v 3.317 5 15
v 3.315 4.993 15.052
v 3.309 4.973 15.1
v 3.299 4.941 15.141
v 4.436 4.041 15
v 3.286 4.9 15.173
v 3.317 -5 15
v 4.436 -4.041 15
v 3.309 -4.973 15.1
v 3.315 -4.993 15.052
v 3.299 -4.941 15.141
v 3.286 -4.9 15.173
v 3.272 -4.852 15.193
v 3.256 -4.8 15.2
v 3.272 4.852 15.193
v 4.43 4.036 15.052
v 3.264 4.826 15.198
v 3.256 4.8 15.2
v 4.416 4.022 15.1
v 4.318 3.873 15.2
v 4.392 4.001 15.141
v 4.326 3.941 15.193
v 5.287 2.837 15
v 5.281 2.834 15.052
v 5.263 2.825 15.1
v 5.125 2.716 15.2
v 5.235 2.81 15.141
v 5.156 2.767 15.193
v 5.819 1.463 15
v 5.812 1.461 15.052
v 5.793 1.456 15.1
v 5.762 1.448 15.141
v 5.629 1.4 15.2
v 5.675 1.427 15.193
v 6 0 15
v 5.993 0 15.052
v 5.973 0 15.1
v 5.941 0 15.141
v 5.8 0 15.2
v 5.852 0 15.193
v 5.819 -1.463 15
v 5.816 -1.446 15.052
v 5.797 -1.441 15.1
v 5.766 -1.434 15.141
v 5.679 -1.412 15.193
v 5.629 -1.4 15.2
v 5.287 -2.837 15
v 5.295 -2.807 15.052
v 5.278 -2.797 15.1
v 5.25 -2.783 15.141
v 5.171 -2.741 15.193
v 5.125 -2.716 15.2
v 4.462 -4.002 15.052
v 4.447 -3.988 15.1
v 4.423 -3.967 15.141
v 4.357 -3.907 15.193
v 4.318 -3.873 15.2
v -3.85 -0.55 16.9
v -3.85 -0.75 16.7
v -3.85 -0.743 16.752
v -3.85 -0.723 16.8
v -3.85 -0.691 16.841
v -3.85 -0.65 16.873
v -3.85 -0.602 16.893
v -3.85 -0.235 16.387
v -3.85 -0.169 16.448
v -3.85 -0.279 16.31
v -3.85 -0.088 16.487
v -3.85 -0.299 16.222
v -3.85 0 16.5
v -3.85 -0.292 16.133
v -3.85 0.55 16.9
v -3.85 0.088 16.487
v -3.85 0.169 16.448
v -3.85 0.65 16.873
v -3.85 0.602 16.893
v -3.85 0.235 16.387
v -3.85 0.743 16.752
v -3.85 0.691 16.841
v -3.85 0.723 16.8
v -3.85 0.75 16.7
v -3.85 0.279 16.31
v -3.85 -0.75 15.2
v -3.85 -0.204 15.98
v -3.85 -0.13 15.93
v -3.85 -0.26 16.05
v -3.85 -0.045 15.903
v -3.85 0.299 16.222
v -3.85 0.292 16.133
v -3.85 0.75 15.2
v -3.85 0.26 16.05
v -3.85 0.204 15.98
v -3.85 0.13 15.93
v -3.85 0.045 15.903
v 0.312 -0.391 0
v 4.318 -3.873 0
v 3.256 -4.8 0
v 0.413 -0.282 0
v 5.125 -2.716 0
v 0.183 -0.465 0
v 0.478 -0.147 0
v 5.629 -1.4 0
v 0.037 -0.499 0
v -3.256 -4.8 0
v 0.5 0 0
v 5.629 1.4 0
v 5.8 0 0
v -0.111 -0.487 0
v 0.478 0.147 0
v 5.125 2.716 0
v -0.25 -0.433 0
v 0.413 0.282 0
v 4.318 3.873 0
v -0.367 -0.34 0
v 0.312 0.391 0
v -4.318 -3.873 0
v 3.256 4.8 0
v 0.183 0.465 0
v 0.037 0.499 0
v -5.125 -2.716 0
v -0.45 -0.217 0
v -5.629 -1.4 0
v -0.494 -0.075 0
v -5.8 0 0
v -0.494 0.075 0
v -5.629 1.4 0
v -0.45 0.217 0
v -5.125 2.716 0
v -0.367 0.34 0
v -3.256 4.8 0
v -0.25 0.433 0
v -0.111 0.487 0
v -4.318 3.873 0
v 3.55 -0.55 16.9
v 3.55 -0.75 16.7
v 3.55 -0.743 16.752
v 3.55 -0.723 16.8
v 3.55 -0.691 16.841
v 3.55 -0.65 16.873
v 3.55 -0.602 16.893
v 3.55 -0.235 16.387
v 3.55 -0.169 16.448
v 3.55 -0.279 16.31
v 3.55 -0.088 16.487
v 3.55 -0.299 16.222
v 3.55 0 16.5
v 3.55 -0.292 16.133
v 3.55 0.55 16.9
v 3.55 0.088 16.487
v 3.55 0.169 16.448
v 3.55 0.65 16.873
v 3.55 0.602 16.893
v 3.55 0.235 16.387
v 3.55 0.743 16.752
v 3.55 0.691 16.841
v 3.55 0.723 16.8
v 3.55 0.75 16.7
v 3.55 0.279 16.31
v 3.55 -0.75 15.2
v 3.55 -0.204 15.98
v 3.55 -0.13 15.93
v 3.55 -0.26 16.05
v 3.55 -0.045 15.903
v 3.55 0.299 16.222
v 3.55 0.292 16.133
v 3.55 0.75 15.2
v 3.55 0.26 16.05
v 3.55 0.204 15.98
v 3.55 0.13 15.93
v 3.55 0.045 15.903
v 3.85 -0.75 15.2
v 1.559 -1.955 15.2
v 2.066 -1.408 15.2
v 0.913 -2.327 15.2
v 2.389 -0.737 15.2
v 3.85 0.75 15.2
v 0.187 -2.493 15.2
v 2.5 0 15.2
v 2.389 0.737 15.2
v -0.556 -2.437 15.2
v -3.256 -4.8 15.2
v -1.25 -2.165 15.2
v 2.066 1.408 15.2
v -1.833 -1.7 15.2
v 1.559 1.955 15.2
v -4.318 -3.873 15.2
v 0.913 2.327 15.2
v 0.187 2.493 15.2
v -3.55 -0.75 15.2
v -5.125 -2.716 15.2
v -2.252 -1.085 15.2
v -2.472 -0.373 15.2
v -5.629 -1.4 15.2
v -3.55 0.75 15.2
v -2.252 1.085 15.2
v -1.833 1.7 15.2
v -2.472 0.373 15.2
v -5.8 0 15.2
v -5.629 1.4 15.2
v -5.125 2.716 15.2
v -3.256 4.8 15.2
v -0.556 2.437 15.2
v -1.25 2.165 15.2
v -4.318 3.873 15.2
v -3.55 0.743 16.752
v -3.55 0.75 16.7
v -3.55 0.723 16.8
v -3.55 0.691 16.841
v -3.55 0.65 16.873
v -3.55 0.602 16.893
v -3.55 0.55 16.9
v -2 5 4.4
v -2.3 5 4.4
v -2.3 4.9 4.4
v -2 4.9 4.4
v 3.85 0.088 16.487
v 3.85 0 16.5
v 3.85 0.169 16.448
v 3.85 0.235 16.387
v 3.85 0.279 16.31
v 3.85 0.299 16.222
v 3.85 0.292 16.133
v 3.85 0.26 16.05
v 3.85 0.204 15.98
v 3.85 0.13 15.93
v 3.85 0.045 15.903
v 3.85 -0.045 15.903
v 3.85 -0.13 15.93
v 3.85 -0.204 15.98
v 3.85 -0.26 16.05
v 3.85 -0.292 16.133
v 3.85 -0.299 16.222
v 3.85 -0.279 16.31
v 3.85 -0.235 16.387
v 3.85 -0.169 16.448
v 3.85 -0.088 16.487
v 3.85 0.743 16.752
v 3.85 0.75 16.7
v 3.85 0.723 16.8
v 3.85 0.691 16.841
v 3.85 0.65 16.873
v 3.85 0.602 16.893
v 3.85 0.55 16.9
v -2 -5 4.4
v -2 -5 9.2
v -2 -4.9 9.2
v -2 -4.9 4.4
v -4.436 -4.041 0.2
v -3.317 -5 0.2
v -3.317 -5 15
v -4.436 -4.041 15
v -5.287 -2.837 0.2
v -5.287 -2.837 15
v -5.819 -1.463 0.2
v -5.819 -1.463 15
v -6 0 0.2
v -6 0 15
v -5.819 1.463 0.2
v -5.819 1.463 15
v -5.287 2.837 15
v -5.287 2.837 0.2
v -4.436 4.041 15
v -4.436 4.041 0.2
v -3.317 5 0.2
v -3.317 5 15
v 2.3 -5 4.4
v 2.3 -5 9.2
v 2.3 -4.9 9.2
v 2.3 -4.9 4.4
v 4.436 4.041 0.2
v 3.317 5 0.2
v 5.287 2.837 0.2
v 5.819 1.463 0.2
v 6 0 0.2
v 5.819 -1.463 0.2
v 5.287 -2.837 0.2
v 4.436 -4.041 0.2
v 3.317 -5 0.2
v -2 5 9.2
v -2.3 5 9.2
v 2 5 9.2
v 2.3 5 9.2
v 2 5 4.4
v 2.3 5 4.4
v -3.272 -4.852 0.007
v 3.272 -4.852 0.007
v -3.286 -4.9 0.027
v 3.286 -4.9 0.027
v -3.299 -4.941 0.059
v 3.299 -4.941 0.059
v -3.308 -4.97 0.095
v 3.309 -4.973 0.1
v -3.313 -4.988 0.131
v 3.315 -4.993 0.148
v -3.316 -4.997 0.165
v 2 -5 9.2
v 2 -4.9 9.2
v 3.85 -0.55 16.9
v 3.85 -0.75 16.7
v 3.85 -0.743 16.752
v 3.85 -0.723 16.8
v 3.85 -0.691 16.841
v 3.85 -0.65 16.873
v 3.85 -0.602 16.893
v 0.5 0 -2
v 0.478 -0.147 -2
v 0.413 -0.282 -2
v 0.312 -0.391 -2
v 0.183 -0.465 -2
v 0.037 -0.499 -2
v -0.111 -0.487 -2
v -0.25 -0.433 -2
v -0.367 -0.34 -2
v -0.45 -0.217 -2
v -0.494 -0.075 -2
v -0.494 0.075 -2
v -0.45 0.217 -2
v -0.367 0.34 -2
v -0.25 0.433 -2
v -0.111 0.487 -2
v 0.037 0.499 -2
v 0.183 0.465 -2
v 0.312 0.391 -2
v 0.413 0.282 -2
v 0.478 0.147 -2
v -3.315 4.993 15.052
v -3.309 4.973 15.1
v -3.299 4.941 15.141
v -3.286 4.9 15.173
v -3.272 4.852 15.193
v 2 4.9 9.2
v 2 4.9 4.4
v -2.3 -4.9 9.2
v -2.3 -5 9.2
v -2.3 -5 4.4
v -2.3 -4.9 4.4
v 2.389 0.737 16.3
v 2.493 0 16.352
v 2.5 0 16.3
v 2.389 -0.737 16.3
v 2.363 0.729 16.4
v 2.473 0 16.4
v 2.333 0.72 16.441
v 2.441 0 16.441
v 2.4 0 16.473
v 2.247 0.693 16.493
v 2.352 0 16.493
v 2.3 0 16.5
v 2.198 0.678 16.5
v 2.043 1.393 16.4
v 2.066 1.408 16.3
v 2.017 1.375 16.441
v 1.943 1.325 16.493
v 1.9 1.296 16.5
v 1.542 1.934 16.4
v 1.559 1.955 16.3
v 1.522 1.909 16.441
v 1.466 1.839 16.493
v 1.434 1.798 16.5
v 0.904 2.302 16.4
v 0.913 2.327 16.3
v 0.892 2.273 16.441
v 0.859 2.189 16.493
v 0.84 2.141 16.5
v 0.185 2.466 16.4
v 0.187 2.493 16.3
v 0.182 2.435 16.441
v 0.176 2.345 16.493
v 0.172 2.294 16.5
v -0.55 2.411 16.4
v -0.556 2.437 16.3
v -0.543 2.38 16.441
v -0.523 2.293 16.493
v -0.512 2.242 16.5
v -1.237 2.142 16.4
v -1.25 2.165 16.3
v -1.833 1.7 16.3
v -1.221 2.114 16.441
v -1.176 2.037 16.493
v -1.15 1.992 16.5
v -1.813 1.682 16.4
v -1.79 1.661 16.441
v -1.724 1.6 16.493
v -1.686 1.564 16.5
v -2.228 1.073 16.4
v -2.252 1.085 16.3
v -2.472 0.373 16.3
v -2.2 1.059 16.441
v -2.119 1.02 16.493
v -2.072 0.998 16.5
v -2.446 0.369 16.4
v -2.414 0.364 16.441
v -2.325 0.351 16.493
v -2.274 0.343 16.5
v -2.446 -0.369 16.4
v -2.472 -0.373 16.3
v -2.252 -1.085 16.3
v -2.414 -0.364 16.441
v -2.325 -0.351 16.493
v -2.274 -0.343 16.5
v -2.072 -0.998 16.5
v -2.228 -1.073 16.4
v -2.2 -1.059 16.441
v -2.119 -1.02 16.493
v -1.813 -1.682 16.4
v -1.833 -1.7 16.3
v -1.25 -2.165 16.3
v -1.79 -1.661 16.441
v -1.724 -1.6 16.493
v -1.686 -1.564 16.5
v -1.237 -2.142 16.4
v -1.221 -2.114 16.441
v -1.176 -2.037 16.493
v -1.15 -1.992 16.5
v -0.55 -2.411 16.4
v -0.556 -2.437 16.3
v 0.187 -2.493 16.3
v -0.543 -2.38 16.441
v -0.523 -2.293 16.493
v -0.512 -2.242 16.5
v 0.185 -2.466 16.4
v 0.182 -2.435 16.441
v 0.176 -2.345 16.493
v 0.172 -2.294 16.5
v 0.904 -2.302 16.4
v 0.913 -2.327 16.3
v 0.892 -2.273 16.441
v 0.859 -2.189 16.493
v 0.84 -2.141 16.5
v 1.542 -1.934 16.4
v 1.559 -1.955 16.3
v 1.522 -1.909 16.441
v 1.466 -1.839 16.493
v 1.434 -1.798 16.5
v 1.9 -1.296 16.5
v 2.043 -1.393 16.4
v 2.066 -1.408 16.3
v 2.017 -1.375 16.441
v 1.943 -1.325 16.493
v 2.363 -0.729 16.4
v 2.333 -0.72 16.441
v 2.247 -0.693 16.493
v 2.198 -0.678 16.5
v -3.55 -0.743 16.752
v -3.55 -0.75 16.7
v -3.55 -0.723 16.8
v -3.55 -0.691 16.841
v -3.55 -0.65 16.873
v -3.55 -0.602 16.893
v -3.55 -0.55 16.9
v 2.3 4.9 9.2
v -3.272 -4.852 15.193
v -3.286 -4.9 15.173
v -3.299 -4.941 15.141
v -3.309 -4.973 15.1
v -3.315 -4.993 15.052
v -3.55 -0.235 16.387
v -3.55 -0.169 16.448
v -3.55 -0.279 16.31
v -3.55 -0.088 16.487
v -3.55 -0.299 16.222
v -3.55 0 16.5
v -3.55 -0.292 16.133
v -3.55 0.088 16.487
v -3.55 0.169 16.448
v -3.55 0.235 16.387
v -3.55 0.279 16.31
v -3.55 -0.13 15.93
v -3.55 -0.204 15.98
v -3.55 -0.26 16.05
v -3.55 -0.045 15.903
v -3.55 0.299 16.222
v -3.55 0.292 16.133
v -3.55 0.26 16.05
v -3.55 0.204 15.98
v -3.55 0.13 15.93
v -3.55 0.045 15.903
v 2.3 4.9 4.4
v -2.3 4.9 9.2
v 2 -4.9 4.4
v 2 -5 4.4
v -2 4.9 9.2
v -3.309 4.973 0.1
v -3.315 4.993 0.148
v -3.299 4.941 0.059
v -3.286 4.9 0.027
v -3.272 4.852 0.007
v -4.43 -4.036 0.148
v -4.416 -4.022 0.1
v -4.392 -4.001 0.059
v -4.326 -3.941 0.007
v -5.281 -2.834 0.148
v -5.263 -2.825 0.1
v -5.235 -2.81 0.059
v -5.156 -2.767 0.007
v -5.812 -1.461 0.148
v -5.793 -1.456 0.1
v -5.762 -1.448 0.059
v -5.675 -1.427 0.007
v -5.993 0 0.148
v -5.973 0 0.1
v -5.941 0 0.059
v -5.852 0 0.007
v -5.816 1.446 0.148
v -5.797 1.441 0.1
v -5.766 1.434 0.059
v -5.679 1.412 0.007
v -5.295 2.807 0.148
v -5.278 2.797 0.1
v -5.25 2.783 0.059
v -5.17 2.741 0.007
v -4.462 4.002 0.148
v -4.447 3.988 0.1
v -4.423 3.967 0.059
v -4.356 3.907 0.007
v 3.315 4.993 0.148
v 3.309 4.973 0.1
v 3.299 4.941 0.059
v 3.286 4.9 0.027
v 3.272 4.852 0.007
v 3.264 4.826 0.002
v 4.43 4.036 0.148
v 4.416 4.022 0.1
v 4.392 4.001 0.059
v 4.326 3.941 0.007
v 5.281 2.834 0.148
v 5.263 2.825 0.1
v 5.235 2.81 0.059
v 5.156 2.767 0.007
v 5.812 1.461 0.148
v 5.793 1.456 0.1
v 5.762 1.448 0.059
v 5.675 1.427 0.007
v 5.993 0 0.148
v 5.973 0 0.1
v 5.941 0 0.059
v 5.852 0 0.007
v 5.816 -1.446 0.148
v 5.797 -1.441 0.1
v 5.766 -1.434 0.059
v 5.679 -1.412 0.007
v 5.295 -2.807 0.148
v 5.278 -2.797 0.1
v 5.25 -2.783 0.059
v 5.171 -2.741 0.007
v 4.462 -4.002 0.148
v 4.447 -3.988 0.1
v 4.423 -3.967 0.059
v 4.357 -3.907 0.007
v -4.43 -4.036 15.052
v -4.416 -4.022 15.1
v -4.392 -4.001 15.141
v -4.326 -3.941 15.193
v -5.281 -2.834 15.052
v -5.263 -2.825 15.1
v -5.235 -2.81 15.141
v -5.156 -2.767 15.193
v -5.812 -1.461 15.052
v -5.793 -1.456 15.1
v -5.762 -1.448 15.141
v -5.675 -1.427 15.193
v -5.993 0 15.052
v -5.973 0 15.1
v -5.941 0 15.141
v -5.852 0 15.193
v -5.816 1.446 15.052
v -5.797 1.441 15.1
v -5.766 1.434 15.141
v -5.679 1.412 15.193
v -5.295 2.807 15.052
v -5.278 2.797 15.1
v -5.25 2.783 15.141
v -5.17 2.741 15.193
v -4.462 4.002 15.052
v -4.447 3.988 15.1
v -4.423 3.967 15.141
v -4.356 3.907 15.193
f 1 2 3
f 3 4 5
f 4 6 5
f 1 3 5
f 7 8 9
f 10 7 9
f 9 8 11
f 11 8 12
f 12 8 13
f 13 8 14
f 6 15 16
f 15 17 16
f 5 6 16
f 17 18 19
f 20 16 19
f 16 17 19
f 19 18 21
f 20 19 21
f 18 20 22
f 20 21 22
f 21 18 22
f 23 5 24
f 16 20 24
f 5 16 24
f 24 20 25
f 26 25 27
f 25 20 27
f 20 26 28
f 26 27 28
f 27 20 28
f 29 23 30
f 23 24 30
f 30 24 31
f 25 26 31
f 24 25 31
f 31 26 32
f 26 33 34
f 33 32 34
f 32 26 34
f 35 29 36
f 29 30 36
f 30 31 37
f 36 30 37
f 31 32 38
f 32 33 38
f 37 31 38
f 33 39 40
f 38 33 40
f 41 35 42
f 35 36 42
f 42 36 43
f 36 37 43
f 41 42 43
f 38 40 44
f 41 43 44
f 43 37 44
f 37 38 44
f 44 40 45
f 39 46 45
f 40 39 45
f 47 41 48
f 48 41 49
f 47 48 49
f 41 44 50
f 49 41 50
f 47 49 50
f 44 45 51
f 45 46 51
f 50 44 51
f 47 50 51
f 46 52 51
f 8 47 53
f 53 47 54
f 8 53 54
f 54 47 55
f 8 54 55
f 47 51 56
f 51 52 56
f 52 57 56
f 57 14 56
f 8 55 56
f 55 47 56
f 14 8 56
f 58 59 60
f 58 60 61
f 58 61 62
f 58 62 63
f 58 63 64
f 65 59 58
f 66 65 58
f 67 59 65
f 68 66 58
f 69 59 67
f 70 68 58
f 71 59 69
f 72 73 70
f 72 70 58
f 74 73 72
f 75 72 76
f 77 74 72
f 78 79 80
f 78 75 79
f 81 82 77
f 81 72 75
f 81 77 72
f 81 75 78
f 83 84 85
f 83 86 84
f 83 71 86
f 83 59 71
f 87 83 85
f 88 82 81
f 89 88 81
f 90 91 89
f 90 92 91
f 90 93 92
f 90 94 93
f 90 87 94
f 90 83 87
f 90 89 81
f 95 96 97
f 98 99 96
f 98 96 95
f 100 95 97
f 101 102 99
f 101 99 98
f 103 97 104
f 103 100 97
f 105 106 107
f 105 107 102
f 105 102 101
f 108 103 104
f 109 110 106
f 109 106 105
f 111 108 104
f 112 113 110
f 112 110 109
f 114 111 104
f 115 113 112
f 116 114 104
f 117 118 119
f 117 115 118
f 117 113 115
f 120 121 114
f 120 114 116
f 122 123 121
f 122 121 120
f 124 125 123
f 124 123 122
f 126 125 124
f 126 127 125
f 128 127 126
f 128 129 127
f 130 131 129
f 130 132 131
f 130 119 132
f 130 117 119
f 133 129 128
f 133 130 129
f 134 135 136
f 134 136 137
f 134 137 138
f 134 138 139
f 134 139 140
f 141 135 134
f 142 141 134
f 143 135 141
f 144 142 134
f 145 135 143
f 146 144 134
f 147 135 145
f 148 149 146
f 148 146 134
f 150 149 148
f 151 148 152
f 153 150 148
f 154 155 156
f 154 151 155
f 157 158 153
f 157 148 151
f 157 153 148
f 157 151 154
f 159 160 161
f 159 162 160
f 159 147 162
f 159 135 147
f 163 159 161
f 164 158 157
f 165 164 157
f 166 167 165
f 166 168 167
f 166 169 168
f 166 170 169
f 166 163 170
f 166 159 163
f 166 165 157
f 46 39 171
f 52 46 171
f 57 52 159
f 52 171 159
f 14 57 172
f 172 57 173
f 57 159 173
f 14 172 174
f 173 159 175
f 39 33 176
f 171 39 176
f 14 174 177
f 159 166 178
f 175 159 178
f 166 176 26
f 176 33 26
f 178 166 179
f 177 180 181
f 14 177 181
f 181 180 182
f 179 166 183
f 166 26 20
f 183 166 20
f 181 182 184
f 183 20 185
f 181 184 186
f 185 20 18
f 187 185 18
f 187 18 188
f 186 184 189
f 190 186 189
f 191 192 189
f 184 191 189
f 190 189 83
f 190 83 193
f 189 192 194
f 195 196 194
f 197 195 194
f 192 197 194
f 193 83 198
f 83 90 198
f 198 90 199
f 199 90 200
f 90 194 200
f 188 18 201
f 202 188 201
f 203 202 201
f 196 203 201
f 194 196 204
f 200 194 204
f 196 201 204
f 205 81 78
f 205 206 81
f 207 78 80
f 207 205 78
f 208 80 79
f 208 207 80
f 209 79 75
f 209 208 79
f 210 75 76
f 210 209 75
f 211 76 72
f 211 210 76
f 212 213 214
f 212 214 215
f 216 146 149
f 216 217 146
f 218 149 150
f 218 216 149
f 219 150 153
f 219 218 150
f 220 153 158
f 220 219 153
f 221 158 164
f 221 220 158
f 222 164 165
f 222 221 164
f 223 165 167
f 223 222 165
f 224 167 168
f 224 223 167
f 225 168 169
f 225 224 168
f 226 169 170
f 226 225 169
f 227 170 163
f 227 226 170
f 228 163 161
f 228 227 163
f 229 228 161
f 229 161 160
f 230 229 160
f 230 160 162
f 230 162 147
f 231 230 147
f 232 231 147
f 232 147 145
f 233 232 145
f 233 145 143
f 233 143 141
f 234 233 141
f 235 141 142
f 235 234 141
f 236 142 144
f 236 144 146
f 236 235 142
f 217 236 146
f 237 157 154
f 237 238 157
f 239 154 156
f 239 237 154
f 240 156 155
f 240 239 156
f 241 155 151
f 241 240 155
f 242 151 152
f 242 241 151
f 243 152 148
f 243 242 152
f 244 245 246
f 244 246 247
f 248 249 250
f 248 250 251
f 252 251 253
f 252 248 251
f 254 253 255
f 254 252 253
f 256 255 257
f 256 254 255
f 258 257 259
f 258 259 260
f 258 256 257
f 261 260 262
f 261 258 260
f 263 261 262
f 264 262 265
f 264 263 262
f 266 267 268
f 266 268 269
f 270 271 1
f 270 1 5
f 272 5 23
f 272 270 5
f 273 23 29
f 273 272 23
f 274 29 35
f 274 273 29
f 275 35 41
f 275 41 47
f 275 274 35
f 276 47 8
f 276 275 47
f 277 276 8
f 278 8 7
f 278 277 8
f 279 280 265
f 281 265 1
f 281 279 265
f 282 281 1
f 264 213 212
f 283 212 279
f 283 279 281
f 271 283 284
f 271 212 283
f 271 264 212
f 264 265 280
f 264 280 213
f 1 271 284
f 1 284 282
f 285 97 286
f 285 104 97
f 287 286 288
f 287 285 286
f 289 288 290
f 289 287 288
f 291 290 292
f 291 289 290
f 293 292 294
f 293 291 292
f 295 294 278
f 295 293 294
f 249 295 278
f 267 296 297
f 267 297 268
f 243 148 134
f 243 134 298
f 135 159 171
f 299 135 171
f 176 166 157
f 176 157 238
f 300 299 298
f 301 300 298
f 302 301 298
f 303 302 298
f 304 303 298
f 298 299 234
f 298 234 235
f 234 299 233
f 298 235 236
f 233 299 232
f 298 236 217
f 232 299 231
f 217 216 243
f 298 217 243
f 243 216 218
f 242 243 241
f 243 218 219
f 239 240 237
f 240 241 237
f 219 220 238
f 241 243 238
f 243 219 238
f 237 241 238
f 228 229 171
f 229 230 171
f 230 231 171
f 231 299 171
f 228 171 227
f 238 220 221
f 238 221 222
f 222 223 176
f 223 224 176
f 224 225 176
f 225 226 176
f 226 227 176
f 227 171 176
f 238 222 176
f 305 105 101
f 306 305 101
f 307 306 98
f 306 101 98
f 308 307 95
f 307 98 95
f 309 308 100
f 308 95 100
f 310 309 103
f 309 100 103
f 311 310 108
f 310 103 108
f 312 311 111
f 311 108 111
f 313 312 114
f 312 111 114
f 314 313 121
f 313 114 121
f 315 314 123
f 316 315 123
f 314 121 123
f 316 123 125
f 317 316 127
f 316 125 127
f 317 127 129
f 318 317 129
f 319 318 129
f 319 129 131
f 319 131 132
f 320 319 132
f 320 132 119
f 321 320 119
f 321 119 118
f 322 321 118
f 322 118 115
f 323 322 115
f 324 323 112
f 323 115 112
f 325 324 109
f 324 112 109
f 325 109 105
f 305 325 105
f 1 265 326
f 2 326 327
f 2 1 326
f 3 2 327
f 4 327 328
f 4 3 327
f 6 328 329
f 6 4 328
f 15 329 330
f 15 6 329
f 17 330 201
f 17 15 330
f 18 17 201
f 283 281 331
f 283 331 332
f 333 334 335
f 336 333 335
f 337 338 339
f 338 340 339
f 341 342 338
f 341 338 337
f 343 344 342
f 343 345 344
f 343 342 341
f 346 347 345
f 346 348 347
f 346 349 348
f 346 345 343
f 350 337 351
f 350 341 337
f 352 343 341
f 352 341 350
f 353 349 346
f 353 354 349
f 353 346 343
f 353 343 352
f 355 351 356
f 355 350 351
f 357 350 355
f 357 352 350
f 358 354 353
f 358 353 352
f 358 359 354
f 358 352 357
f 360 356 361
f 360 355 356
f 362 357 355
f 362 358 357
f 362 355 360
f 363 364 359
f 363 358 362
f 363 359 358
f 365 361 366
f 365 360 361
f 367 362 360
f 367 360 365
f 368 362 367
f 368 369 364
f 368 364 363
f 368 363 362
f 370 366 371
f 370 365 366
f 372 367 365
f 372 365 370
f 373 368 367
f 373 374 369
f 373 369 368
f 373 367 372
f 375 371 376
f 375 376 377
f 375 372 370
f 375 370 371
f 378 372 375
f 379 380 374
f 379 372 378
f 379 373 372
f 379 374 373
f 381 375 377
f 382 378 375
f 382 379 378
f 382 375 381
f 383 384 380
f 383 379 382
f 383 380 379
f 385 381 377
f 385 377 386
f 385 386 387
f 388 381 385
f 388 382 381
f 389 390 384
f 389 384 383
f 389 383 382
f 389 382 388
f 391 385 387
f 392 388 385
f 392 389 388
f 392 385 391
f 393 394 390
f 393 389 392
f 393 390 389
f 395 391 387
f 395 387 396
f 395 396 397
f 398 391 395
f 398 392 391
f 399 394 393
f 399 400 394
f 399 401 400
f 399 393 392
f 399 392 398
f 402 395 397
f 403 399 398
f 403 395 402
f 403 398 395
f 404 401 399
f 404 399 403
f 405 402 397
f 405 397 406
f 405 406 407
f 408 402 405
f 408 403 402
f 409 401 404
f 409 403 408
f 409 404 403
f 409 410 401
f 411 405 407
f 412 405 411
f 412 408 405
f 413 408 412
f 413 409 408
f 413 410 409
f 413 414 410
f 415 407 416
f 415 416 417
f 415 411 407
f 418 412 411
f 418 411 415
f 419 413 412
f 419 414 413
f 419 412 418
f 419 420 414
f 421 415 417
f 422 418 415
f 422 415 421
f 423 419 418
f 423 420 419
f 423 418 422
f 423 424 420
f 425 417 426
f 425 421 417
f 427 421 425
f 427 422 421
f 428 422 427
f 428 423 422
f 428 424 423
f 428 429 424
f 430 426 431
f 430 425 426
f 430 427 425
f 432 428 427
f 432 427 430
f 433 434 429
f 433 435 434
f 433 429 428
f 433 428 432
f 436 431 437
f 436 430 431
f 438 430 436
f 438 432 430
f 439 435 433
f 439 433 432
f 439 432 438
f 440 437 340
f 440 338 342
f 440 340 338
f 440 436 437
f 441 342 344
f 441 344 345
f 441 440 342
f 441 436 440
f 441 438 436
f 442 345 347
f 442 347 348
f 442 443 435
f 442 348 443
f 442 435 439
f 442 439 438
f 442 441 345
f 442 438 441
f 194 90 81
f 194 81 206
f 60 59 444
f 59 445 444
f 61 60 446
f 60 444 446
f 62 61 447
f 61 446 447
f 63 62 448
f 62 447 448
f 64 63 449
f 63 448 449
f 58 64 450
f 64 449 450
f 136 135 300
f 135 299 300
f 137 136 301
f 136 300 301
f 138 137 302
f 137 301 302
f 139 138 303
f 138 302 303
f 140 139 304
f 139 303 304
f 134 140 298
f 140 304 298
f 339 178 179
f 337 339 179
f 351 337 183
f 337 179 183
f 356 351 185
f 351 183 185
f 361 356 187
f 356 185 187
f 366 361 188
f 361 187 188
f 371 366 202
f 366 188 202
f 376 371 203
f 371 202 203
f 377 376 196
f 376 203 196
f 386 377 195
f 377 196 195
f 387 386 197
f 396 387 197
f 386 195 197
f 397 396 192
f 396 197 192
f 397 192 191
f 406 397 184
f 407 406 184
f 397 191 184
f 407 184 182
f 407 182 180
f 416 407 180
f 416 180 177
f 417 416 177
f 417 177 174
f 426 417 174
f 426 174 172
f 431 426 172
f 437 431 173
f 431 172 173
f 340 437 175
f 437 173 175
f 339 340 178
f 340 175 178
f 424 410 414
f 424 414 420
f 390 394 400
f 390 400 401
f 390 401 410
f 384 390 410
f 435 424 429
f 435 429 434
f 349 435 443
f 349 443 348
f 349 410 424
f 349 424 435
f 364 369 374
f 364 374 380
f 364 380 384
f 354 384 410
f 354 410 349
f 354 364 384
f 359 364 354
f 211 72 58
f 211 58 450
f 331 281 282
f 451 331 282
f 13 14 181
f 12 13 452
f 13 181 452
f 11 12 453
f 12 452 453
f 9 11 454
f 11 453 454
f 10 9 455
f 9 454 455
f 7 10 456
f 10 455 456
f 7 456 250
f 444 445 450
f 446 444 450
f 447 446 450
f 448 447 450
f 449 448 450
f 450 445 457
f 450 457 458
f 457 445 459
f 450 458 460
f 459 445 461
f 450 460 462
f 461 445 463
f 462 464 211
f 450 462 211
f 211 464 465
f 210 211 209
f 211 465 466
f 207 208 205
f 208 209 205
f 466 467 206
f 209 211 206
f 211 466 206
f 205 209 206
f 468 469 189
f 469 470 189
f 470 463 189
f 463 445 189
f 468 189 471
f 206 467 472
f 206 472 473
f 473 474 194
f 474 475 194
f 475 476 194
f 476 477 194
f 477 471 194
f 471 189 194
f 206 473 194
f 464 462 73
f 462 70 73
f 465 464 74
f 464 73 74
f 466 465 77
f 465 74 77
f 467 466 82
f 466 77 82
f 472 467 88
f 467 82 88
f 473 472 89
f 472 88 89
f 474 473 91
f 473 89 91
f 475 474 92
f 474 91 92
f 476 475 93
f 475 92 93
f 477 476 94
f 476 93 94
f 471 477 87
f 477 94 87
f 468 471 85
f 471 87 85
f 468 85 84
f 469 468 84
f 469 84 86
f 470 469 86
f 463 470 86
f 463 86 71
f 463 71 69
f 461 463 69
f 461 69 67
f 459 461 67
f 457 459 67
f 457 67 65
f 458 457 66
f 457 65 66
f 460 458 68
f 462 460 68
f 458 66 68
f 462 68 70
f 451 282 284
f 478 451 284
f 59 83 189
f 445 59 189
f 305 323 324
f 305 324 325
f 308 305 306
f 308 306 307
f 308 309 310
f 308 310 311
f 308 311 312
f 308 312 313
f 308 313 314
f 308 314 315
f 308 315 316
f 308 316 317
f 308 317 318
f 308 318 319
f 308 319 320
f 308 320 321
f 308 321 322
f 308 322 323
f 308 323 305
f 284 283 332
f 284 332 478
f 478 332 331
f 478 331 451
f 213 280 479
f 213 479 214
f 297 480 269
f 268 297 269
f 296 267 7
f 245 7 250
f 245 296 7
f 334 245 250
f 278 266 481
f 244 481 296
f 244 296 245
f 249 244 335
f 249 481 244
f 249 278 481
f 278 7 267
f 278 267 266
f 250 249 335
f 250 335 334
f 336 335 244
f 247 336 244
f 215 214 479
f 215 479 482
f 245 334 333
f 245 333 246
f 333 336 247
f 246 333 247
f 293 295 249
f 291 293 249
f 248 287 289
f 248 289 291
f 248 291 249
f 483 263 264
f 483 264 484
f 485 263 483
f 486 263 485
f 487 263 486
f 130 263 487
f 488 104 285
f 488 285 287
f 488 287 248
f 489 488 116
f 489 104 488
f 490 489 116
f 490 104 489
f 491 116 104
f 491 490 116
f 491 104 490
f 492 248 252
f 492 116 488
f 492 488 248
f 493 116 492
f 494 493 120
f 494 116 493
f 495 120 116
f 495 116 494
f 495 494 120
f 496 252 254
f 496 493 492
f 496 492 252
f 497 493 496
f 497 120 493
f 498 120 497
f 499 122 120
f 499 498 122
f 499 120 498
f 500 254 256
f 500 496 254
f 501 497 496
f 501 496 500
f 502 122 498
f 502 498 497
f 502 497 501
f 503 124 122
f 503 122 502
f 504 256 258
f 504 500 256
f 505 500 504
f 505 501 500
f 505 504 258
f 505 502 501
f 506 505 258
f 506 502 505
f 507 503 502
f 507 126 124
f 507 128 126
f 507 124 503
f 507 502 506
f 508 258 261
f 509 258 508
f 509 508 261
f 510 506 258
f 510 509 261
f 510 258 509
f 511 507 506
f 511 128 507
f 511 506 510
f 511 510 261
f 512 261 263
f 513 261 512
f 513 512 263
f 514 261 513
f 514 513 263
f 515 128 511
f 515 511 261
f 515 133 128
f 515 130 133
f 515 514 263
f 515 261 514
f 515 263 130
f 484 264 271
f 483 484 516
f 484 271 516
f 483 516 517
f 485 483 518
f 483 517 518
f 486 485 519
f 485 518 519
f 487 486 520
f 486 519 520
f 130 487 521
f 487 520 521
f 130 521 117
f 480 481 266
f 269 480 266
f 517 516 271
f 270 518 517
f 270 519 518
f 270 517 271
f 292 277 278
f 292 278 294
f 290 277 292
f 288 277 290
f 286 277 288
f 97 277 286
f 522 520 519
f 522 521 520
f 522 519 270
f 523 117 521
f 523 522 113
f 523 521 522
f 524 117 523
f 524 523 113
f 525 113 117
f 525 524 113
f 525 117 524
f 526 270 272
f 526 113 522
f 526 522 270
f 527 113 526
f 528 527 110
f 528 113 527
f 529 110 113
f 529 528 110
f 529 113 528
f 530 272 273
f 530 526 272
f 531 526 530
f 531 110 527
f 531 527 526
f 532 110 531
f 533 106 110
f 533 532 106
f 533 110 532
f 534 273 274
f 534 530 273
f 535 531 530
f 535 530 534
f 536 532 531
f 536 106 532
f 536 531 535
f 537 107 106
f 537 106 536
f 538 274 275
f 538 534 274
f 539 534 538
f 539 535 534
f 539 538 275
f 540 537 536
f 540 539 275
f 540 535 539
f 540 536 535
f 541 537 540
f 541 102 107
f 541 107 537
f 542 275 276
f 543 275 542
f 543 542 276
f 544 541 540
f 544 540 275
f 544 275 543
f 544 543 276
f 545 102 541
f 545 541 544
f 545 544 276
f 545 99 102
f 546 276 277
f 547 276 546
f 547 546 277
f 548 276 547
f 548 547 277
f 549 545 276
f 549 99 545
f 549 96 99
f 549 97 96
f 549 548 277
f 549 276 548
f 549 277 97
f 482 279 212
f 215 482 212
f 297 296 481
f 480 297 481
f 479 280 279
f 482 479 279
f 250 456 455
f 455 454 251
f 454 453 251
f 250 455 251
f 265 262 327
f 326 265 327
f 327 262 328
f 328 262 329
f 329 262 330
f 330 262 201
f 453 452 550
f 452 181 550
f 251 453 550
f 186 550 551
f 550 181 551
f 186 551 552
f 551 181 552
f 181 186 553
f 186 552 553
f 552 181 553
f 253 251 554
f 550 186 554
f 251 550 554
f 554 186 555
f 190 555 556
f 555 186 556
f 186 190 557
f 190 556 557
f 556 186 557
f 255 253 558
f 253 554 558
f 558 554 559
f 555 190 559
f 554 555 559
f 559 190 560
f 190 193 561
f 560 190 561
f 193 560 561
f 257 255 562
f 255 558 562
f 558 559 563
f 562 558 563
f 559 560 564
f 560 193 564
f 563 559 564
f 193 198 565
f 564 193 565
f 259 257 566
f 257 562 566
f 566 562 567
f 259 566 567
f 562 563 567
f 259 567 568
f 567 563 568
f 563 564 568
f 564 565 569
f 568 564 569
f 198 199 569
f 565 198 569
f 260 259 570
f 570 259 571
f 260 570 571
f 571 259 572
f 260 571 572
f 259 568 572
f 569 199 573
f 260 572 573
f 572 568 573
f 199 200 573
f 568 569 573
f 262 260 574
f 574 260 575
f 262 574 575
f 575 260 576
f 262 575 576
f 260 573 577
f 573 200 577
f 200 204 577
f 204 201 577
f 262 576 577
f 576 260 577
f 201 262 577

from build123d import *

# Parameters (mm, degrees)
AUFSATZ_LINEAR_AUSTRAGEN1_DEPTH = 15.2
SKIZZE2_R                       = 2.5
AUFSATZ_LINEAR_AUSTRAGEN2_DEPTH = 1.3
SKIZZE3_R                       = 0.5
AUFSATZ_LINEAR_AUSTRAGEN3_DEPTH = 2
VERRUNDUNG1_R                   = 0.2
SKIZZE4_W                       = 0.3
SKIZZE4_H                       = 4.8
SCHNITT_LINEAR_AUSTRAGEN1_DEPTH = 0.1
SKIZZE5_W                       = 0.3
SKIZZE5_H                       = 1.5
AUFSATZ_LINEAR_AUSTRAGEN4_DEPTH = 1.7
SCHNITT_LINEAR_AUSTRAGEN2_REACH = 22.19
SKIZZE6_R                       = 0.3
VERRUNDUNG2_R                   = 0.2


with BuildPart() as part:
    # Skizze1 → Aufsatz-Linear austragen1 (new body)
    with BuildSketch(Plane.XY):
        with BuildLine():
            Line((-3.31662479, 5), (3.31662479, 5))
            ThreePointArc((3.31662479, 5), (6, 0), (3.31662479, -5))
            Line((3.31662479, -5), (-3.31662479, -5))
            ThreePointArc((-3.31662479, -5), (-6, 0), (-3.31662479, 5))
        make_face()
    extrude(amount=AUFSATZ_LINEAR_AUSTRAGEN1_DEPTH)

    # Skizze2 → Aufsatz-Linear austragen2 (add)
    with BuildSketch(Plane.XY.offset(15.2)):
        Circle(SKIZZE2_R)
    extrude(amount=AUFSATZ_LINEAR_AUSTRAGEN2_DEPTH)

    # Skizze3 → Aufsatz-Linear austragen3 (add)
    with BuildSketch(Plane(origin=(0, 0, 0), x_dir=(-1, 0, 0), z_dir=(0, 0, -1))):
        with Locations(Location((0, 0, 0), (0, 0, 180))):
            Circle(SKIZZE3_R)
    extrude(amount=AUFSATZ_LINEAR_AUSTRAGEN3_DEPTH)

    # Verrundung1
    verrundung1_edges = [part.edges().sort_by_distance(p)[0] for p in [
        (6, 0, 15.2),
        (0, 5, 15.2),
        (-2.5, 0, 16.5),
        (-6, 0, 15.2),
        (0, 5, 0),
        (6, 0, 0),
        (0, -5, 0),
        (-6, 0, 0),
        (0, -5, 15.2),
    ]]
    fillet(verrundung1_edges, radius=VERRUNDUNG1_R)

    # Skizze4 → Schnitt-Linear austragen1 (cut)
    with BuildSketch(Plane(origin=(0, 5, 0), x_dir=(1, 0, 0), z_dir=(0, 1, 0))):
        with Locations((-2.15, -6.8)):
            Rectangle(SKIZZE4_W, SKIZZE4_H)
        with Locations((2.15, -6.8)):
            Rectangle(SKIZZE4_W, SKIZZE4_H)
    schnitt_linear_austragen1 = extrude(amount=-SCHNITT_LINEAR_AUSTRAGEN1_DEPTH, mode=Mode.SUBTRACT)

    # Spiegeln1: Schnitt-Linear austragen1 across plane
    add(schnitt_linear_austragen1.mirror(Plane.ZX), mode=Mode.SUBTRACT)

    # Skizze5 → Aufsatz-Linear austragen4 (add)
    with BuildSketch(Plane.XY.offset(15.2)):
        with Locations((-3.7, 0)):
            Rectangle(SKIZZE5_W, SKIZZE5_H)
        with Locations((3.7, 0)):
            Rectangle(SKIZZE5_W, SKIZZE5_H)
    extrude(amount=AUFSATZ_LINEAR_AUSTRAGEN4_DEPTH)

    # Skizze6 → Schnitt-Linear austragen2 (cut, up to next)
    with BuildSketch(Plane.ZY.offset(3.85), mode=Mode.PRIVATE) as schnitt_linear_austragen2_sk1:
        with Locations((16.2, 0)):
            Circle(SKIZZE6_R)
    schnitt_linear_austragen2_tool1 = extrude(schnitt_linear_austragen2_sk1.sketch, amount=-SCHNITT_LINEAR_AUSTRAGEN2_REACH, mode=Mode.PRIVATE) & part.part
    schnitt_linear_austragen2 = schnitt_linear_austragen2_tool1.solids().sort_by_distance((-3.85, 0, 16.2))[0]
    add(schnitt_linear_austragen2, mode=Mode.SUBTRACT)

    # Spiegeln6: Schnitt-Linear austragen2 across plane
    add(schnitt_linear_austragen2.mirror(Plane(origin=(0, 0, 0), x_dir=(0, 0, 1), z_dir=(1, 0, 0))), mode=Mode.SUBTRACT)

    # Verrundung2
    verrundung2_edges = [part.edges().sort_by_distance(p)[0] for p in [
        (-3.7, -0.75, 16.9),
        (-3.7, 0.75, 16.9),
        (3.7, -0.75, 16.9),
        (3.7, 0.75, 16.9),
    ]]
    fillet(verrundung2_edges, radius=VERRUNDUNG2_R)


solid = part.part
